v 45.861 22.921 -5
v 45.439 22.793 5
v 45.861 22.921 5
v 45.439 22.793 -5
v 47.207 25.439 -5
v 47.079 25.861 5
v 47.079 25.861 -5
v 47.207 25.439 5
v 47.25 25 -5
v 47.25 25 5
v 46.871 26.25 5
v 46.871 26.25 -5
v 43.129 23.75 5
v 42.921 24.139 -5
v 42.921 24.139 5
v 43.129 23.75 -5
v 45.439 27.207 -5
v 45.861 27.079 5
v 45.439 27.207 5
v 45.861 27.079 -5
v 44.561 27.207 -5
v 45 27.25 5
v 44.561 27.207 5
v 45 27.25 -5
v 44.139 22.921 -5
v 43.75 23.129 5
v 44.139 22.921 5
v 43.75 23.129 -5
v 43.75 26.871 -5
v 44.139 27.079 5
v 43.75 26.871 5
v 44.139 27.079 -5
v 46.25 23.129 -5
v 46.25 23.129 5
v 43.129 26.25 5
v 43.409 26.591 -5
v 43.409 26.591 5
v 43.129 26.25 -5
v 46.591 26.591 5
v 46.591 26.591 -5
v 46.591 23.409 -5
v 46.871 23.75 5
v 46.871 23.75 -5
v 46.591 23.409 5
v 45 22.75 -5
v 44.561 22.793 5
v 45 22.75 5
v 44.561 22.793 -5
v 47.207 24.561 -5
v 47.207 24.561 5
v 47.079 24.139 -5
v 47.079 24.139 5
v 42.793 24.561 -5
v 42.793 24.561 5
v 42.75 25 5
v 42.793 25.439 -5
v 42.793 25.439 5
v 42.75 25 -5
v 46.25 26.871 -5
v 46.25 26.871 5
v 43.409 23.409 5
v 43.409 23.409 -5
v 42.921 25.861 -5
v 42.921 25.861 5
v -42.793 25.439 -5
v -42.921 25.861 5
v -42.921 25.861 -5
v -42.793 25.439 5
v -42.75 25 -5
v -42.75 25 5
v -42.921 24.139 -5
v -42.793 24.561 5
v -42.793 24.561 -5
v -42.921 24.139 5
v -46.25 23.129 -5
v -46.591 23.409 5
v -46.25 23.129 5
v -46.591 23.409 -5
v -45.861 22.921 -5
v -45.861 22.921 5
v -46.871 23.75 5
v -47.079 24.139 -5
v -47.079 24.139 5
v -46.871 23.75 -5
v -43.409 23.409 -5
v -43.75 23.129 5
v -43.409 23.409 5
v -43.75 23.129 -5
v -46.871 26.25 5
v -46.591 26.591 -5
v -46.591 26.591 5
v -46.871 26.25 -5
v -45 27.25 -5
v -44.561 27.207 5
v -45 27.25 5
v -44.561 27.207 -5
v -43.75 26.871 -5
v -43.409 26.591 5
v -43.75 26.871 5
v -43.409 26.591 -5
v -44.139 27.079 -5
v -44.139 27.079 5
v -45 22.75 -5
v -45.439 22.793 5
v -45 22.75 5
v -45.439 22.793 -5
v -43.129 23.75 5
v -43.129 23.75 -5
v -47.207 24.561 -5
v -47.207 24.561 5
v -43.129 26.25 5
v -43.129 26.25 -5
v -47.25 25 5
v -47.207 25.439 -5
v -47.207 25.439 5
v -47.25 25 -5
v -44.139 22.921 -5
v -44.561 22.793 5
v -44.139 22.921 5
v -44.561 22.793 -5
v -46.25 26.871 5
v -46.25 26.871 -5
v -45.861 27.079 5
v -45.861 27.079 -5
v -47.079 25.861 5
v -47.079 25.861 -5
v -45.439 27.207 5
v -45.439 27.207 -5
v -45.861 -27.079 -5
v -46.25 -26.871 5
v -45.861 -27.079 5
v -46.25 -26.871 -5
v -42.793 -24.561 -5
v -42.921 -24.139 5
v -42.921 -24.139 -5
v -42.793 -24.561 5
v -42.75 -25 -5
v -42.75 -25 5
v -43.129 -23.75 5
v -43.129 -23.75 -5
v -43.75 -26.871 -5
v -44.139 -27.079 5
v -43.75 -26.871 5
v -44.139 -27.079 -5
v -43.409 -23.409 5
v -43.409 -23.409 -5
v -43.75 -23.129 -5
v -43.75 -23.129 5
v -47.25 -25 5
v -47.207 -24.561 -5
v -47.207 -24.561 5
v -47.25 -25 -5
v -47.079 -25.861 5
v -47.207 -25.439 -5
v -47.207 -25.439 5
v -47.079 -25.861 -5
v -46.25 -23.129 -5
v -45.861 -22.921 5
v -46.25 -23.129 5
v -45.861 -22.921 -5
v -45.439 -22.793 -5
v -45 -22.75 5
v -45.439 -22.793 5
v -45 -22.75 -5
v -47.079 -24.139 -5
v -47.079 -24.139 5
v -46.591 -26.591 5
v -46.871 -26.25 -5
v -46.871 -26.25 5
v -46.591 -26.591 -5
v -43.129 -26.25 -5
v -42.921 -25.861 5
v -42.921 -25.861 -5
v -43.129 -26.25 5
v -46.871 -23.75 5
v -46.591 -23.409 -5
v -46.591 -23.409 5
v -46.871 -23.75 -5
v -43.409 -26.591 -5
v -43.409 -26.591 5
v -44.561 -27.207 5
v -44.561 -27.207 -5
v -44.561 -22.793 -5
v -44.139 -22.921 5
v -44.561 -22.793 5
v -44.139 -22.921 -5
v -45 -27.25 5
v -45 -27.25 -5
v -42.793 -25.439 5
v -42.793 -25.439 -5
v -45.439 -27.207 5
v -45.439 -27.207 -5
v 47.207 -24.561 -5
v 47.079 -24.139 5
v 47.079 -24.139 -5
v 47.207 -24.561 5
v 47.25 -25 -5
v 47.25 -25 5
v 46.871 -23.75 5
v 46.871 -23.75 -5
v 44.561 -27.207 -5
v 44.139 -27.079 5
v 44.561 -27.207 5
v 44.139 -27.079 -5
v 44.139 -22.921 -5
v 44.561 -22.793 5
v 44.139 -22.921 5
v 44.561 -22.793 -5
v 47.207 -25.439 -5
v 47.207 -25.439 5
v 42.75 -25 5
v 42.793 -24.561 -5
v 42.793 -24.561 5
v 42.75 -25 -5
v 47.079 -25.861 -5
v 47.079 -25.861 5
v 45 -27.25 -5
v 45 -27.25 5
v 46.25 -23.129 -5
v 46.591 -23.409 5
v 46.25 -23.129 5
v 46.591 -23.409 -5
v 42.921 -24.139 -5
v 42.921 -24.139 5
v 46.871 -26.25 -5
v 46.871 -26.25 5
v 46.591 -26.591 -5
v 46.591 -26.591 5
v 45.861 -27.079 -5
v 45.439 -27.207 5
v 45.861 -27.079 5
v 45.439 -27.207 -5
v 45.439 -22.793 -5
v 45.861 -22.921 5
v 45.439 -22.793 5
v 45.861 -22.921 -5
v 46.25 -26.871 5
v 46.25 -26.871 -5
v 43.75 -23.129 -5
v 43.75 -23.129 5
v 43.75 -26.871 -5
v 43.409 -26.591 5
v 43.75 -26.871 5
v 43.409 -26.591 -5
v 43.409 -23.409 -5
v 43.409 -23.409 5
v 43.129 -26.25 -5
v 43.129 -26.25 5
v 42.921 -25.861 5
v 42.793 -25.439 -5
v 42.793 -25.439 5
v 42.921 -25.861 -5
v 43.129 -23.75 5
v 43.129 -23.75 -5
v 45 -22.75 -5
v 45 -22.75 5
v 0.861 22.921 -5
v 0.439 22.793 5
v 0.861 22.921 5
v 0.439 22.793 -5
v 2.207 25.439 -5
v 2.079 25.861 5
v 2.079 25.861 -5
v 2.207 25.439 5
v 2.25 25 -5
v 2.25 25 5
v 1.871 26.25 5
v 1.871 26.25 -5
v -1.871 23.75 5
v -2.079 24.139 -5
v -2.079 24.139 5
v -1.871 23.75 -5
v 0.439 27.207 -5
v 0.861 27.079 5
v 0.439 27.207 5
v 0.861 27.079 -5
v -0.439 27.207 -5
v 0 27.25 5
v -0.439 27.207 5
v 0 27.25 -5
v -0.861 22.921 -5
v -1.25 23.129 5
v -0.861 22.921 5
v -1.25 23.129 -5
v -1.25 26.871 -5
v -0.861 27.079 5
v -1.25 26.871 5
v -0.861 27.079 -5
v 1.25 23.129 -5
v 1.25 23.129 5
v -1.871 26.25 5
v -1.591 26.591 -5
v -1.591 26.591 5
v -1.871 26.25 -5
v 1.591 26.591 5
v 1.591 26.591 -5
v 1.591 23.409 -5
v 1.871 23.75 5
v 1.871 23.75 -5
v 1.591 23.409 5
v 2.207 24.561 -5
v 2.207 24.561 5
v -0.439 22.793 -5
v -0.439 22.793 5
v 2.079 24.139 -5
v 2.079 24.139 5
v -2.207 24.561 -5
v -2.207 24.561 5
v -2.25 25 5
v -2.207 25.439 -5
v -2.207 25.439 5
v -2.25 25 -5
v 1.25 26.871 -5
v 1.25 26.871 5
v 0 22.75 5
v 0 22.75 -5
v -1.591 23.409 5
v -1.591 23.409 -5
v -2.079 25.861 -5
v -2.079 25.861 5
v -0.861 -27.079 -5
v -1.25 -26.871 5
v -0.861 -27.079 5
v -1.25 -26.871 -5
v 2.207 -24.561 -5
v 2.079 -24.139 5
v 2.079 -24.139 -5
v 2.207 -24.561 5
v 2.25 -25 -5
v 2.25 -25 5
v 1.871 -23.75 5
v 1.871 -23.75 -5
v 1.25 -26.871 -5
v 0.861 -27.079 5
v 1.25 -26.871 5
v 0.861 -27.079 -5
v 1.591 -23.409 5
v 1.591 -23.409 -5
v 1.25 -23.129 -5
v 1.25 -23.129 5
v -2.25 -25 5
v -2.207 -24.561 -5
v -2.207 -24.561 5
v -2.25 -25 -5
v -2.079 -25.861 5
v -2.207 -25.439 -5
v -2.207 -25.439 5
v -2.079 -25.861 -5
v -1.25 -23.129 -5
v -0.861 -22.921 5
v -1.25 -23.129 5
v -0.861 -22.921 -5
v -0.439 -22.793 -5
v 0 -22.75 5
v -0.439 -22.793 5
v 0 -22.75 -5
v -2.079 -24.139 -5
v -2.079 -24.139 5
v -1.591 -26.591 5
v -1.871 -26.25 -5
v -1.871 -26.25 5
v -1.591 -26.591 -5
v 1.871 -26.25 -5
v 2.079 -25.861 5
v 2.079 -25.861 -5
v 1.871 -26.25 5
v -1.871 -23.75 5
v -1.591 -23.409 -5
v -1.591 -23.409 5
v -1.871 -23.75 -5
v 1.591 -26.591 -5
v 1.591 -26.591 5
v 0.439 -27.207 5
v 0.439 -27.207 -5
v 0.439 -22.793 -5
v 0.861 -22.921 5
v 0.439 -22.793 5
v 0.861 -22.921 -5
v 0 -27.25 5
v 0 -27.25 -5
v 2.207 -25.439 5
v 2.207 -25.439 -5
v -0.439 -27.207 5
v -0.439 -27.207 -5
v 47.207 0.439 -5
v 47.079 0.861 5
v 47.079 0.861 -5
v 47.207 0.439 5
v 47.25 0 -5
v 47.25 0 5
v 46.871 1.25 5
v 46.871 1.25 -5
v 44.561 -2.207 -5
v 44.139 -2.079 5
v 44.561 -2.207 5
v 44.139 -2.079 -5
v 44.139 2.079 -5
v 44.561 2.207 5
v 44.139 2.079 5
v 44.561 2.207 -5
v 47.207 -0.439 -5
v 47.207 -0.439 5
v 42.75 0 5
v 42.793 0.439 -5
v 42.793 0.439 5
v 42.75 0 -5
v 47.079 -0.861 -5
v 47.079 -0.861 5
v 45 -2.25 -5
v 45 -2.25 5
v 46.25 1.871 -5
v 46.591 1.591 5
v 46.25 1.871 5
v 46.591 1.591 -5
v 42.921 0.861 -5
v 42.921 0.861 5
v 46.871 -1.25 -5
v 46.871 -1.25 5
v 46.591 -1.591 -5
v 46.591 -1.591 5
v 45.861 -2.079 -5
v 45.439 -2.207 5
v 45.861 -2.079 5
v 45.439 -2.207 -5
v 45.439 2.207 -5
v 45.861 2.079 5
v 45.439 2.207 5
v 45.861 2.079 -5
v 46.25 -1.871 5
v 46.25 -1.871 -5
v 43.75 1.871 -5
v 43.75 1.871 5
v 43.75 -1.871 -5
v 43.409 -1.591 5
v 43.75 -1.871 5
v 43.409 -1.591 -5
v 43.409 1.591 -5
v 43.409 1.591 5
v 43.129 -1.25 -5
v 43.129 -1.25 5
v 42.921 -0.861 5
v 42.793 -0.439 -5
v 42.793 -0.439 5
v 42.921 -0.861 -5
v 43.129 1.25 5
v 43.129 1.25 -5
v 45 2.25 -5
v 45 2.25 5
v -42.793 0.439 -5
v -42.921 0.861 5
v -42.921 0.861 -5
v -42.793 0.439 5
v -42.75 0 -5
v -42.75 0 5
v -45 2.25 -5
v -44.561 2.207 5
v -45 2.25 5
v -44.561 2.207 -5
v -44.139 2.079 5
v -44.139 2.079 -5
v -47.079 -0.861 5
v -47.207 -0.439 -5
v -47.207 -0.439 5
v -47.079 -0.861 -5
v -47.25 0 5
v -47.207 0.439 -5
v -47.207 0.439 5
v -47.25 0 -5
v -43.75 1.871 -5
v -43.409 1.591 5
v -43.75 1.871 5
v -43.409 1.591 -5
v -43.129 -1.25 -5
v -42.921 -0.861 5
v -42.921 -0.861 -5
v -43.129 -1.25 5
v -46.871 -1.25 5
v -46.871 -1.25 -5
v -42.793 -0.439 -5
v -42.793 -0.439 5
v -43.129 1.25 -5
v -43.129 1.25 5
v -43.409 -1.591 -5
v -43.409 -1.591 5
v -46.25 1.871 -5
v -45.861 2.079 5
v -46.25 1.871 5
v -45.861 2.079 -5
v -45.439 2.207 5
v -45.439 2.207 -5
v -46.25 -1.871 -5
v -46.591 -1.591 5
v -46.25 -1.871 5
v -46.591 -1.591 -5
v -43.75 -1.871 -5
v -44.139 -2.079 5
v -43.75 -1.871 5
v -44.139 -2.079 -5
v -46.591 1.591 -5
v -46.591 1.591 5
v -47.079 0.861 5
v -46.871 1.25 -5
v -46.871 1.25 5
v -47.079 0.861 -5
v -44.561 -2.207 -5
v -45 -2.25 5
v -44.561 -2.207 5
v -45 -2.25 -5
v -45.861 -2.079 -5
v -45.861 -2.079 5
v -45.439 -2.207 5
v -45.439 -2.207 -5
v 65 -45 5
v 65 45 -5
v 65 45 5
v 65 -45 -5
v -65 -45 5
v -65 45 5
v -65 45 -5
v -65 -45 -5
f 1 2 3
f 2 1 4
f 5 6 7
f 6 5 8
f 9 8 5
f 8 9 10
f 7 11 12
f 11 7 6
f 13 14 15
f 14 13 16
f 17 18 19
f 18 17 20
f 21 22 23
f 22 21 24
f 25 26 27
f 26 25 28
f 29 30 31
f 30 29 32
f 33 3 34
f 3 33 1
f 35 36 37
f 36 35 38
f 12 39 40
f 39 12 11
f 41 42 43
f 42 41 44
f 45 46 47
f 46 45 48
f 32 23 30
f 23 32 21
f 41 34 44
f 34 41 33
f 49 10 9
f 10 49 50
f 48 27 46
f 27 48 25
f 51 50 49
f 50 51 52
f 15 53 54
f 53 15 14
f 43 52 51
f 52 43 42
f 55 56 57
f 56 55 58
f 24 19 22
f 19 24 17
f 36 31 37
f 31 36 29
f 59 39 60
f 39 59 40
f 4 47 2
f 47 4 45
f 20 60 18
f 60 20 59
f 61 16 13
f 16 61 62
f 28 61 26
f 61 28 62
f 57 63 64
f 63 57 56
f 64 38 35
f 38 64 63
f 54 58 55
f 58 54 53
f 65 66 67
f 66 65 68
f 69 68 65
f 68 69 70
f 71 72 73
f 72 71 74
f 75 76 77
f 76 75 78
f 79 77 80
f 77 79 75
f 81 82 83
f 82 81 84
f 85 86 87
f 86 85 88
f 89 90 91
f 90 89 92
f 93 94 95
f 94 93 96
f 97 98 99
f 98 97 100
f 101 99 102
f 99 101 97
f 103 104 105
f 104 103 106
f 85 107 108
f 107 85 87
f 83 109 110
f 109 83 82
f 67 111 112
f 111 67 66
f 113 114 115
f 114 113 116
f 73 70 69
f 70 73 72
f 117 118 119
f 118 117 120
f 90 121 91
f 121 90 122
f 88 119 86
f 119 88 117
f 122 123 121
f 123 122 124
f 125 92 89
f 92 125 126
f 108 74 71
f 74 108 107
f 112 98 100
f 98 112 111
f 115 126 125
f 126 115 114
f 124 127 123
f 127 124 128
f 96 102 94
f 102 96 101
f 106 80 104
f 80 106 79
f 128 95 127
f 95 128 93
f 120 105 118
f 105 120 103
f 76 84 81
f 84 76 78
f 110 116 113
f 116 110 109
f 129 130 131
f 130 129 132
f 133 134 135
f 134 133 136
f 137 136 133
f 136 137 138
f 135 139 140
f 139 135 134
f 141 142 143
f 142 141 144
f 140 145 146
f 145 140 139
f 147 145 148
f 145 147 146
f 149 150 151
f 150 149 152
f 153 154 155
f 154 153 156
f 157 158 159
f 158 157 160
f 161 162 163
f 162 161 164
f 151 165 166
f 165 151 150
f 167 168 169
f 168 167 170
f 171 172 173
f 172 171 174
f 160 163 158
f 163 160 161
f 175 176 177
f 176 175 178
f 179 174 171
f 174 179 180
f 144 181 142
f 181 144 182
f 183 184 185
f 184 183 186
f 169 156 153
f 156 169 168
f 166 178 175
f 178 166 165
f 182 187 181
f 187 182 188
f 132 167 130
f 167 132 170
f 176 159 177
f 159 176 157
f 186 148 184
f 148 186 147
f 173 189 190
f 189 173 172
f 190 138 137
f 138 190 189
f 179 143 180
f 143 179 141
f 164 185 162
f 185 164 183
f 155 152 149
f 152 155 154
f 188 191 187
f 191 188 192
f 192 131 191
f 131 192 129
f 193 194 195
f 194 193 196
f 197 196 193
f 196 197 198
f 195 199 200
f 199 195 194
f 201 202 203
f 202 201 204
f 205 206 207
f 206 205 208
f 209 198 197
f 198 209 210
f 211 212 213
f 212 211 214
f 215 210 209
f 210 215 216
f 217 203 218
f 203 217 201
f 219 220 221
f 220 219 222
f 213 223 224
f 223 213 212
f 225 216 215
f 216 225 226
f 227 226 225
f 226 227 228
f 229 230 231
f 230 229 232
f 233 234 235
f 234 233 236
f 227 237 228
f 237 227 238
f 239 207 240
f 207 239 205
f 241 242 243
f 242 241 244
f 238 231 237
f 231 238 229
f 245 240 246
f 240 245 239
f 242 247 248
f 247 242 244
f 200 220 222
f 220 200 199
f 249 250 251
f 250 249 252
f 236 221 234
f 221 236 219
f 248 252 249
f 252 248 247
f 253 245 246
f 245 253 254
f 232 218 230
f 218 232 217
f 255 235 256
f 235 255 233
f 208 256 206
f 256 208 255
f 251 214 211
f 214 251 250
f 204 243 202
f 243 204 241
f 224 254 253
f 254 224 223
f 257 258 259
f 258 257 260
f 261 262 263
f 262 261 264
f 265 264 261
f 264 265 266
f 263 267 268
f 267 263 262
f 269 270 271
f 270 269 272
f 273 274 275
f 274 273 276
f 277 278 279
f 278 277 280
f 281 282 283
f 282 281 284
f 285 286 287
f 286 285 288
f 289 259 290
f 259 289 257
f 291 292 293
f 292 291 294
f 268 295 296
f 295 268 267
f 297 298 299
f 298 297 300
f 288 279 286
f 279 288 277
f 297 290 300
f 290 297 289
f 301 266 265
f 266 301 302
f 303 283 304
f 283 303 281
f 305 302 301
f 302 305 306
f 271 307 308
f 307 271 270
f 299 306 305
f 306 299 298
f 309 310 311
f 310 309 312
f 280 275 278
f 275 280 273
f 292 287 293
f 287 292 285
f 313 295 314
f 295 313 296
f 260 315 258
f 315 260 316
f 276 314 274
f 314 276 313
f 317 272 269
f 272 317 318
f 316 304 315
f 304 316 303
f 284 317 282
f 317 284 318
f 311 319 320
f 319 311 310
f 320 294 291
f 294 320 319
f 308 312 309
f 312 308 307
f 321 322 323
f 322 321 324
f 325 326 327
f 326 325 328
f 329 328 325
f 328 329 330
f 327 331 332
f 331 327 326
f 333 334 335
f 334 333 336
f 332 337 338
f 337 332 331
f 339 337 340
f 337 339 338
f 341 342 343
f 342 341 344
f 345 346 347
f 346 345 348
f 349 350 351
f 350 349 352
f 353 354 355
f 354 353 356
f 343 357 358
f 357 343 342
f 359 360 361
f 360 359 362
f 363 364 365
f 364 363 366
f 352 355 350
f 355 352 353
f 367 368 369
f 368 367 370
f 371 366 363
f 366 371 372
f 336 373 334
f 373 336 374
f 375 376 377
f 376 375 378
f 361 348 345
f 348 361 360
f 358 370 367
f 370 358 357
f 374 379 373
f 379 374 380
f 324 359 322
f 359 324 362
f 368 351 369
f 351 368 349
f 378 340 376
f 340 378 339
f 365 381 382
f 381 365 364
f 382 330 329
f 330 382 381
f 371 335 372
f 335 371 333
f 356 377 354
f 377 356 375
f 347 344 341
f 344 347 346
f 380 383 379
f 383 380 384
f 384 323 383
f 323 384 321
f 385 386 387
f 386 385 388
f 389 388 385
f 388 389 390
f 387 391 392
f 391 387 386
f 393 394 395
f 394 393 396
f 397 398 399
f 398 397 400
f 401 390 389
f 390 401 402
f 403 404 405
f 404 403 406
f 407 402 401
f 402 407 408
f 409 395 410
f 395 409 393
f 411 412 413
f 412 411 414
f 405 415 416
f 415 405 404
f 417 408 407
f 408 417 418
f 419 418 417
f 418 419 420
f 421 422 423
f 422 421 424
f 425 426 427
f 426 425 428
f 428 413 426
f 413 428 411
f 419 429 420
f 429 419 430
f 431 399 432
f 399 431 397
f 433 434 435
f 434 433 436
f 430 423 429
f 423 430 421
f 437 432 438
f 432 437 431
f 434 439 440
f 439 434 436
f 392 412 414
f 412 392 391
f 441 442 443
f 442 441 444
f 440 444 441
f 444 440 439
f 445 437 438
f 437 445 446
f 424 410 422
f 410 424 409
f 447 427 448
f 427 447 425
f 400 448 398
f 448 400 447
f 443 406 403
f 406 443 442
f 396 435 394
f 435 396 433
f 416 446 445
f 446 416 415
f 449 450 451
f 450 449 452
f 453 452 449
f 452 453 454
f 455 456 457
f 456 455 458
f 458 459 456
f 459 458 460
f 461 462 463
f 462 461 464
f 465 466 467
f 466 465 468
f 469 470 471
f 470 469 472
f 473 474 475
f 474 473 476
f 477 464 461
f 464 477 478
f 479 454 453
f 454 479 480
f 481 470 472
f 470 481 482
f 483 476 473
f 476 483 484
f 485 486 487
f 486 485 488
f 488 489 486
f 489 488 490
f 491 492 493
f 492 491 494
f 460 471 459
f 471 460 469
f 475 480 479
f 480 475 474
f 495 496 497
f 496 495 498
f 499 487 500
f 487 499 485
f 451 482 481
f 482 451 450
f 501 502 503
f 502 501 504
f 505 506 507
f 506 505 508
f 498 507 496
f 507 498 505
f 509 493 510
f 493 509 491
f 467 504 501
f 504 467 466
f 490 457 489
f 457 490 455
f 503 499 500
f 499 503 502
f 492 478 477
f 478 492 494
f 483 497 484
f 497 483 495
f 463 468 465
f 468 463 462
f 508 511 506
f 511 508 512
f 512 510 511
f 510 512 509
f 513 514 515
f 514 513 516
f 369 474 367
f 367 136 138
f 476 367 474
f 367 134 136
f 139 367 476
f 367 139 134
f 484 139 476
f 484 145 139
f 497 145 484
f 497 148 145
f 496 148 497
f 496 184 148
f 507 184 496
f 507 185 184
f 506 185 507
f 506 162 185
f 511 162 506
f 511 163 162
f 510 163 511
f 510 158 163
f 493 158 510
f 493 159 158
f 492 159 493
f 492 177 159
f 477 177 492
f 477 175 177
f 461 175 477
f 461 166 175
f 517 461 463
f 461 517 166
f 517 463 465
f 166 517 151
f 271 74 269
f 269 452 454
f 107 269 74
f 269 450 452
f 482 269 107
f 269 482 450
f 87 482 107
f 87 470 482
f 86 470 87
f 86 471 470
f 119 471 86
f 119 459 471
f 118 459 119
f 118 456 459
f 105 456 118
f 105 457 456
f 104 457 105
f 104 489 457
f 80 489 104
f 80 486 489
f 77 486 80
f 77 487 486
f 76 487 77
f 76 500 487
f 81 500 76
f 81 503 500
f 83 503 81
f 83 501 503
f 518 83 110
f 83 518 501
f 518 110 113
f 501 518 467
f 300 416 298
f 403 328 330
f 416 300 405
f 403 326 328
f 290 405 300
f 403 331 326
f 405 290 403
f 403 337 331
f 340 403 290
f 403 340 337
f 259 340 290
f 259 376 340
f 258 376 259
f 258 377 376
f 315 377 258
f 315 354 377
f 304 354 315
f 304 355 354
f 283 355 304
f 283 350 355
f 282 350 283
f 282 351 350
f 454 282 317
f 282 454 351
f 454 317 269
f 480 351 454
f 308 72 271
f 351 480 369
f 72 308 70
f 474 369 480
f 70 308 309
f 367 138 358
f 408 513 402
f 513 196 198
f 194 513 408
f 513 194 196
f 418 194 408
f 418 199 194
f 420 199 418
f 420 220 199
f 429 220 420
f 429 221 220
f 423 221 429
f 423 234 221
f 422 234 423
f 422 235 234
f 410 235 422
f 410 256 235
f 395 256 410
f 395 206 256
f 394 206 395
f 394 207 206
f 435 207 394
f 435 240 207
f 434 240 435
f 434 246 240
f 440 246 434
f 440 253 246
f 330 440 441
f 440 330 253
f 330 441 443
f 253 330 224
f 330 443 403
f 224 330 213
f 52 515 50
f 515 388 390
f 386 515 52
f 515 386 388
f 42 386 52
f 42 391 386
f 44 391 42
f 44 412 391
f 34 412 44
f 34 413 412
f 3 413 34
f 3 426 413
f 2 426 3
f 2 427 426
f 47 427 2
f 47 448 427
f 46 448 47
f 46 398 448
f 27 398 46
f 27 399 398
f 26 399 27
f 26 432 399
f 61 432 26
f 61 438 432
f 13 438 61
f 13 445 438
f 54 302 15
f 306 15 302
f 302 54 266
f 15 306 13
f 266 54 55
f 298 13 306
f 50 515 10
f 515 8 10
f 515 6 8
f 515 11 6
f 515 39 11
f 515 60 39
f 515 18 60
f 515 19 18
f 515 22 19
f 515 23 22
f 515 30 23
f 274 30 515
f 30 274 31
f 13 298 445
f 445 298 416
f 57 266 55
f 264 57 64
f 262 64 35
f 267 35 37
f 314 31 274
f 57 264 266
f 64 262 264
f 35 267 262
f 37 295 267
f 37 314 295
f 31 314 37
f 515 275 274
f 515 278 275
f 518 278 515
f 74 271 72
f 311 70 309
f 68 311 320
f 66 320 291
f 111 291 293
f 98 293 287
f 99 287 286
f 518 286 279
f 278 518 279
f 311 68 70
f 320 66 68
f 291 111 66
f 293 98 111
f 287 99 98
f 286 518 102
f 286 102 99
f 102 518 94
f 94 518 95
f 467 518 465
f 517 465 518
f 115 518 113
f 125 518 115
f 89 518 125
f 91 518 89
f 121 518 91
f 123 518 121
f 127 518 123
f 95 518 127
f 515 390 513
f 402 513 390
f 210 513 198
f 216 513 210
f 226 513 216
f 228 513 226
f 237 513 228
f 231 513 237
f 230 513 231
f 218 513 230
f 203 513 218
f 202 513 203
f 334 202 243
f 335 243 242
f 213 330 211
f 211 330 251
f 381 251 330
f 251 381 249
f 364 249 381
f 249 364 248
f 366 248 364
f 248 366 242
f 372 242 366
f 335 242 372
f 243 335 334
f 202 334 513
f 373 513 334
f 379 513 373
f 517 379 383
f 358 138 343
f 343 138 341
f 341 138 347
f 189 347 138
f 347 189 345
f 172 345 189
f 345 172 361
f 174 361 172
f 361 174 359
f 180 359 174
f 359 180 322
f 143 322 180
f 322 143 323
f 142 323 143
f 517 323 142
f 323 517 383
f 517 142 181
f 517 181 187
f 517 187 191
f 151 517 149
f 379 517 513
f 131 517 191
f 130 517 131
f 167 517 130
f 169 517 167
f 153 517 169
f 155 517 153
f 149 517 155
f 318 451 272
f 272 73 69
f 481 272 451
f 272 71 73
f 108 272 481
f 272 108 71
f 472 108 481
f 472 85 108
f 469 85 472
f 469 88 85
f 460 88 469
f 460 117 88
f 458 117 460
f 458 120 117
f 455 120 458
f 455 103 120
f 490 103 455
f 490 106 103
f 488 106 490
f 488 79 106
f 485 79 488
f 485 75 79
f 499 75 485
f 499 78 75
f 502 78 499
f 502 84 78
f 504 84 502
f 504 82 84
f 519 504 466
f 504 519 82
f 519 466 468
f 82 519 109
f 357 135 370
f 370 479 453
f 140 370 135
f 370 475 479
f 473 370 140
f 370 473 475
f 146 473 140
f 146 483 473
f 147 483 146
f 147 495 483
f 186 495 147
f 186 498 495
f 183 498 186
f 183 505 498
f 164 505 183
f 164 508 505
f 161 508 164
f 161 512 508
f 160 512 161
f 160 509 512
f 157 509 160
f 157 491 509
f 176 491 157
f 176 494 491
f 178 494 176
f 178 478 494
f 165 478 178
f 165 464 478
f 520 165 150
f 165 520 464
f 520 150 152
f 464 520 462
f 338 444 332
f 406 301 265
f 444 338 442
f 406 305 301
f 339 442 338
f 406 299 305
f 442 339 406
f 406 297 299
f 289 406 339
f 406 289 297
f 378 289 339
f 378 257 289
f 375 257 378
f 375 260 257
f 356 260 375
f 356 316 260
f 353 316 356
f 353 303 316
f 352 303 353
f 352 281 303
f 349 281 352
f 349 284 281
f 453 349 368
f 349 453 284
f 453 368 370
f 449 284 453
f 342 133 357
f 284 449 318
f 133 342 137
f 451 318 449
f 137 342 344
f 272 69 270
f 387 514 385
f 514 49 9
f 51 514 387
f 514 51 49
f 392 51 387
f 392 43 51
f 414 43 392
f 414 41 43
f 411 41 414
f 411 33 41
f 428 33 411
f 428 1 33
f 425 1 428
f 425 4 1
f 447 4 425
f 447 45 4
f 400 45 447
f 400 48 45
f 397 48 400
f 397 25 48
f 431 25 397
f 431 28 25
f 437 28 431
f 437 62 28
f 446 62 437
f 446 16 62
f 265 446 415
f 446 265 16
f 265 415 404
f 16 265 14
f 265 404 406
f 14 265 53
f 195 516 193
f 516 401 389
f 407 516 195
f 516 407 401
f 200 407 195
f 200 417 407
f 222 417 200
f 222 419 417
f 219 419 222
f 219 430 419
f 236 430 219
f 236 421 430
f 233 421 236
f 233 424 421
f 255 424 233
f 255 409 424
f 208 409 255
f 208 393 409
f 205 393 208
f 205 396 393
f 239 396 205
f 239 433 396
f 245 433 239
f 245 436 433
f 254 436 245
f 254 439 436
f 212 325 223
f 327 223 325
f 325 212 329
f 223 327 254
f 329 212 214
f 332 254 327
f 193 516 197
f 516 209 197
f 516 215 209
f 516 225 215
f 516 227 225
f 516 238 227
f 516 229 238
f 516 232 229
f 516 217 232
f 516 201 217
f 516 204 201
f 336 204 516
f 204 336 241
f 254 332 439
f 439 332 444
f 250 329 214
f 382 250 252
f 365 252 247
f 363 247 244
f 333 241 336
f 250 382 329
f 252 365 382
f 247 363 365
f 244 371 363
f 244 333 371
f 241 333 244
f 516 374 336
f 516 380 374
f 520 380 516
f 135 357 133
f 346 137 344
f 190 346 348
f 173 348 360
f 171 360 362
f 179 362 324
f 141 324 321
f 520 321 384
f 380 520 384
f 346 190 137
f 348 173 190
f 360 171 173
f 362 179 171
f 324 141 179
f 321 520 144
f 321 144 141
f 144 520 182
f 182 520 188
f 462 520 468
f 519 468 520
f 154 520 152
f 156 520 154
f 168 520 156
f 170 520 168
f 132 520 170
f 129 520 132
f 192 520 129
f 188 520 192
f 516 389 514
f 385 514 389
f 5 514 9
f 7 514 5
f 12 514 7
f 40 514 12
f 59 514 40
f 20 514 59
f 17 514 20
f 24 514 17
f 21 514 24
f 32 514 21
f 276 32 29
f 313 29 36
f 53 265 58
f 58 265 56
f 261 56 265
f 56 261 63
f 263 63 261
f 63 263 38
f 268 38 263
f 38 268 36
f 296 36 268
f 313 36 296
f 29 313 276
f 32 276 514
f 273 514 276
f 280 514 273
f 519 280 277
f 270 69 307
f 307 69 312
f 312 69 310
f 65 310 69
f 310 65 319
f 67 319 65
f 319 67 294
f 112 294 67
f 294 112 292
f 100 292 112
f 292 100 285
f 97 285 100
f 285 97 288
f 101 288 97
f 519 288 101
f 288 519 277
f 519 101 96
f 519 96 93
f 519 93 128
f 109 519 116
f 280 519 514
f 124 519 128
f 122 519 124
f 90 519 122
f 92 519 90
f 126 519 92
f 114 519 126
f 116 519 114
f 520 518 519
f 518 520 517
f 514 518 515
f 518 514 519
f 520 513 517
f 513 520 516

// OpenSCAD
$fn = 32;

// ----------------------------------------------------------------------
// Corner plate 130 x 90 x 10
// 8 holes, centres taken from the edge offset
// ----------------------------------------------------------------------

// --- parameters (mm) ---
plate = [130, 90, 10];  // overall size (x, y, z)
holes = 8;              // number of holes the drawing asks for
hole_d = 4.5;           // hole diameter
edge = 20;              // hole centre offset from the plate edge

// --- derived feature positions (mm) ---
corner_x = plate[0] / 2 - edge;  // = 45   corner hole X
corner_y = plate[1] / 2 - edge;  // = 25   corner hole Y
feature_centers = [
  [corner_x, corner_y],
  [-corner_x, corner_y],
  [-corner_x, -corner_y],
  [corner_x, -corner_y],
  [0, corner_y],
  [0, -corner_y],
  [corner_x, 0],
  [-corner_x, 0]
];   // hole centres the loop below drills

// plate outline, every hole drilled through with the same cutters
difference() {
  cube(plate, center = true);
  for (centre = feature_centers)
    translate([centre[0], centre[1], 0])
      cylinder(d = hole_d, h = plate[2] + 2, center = true);
}
